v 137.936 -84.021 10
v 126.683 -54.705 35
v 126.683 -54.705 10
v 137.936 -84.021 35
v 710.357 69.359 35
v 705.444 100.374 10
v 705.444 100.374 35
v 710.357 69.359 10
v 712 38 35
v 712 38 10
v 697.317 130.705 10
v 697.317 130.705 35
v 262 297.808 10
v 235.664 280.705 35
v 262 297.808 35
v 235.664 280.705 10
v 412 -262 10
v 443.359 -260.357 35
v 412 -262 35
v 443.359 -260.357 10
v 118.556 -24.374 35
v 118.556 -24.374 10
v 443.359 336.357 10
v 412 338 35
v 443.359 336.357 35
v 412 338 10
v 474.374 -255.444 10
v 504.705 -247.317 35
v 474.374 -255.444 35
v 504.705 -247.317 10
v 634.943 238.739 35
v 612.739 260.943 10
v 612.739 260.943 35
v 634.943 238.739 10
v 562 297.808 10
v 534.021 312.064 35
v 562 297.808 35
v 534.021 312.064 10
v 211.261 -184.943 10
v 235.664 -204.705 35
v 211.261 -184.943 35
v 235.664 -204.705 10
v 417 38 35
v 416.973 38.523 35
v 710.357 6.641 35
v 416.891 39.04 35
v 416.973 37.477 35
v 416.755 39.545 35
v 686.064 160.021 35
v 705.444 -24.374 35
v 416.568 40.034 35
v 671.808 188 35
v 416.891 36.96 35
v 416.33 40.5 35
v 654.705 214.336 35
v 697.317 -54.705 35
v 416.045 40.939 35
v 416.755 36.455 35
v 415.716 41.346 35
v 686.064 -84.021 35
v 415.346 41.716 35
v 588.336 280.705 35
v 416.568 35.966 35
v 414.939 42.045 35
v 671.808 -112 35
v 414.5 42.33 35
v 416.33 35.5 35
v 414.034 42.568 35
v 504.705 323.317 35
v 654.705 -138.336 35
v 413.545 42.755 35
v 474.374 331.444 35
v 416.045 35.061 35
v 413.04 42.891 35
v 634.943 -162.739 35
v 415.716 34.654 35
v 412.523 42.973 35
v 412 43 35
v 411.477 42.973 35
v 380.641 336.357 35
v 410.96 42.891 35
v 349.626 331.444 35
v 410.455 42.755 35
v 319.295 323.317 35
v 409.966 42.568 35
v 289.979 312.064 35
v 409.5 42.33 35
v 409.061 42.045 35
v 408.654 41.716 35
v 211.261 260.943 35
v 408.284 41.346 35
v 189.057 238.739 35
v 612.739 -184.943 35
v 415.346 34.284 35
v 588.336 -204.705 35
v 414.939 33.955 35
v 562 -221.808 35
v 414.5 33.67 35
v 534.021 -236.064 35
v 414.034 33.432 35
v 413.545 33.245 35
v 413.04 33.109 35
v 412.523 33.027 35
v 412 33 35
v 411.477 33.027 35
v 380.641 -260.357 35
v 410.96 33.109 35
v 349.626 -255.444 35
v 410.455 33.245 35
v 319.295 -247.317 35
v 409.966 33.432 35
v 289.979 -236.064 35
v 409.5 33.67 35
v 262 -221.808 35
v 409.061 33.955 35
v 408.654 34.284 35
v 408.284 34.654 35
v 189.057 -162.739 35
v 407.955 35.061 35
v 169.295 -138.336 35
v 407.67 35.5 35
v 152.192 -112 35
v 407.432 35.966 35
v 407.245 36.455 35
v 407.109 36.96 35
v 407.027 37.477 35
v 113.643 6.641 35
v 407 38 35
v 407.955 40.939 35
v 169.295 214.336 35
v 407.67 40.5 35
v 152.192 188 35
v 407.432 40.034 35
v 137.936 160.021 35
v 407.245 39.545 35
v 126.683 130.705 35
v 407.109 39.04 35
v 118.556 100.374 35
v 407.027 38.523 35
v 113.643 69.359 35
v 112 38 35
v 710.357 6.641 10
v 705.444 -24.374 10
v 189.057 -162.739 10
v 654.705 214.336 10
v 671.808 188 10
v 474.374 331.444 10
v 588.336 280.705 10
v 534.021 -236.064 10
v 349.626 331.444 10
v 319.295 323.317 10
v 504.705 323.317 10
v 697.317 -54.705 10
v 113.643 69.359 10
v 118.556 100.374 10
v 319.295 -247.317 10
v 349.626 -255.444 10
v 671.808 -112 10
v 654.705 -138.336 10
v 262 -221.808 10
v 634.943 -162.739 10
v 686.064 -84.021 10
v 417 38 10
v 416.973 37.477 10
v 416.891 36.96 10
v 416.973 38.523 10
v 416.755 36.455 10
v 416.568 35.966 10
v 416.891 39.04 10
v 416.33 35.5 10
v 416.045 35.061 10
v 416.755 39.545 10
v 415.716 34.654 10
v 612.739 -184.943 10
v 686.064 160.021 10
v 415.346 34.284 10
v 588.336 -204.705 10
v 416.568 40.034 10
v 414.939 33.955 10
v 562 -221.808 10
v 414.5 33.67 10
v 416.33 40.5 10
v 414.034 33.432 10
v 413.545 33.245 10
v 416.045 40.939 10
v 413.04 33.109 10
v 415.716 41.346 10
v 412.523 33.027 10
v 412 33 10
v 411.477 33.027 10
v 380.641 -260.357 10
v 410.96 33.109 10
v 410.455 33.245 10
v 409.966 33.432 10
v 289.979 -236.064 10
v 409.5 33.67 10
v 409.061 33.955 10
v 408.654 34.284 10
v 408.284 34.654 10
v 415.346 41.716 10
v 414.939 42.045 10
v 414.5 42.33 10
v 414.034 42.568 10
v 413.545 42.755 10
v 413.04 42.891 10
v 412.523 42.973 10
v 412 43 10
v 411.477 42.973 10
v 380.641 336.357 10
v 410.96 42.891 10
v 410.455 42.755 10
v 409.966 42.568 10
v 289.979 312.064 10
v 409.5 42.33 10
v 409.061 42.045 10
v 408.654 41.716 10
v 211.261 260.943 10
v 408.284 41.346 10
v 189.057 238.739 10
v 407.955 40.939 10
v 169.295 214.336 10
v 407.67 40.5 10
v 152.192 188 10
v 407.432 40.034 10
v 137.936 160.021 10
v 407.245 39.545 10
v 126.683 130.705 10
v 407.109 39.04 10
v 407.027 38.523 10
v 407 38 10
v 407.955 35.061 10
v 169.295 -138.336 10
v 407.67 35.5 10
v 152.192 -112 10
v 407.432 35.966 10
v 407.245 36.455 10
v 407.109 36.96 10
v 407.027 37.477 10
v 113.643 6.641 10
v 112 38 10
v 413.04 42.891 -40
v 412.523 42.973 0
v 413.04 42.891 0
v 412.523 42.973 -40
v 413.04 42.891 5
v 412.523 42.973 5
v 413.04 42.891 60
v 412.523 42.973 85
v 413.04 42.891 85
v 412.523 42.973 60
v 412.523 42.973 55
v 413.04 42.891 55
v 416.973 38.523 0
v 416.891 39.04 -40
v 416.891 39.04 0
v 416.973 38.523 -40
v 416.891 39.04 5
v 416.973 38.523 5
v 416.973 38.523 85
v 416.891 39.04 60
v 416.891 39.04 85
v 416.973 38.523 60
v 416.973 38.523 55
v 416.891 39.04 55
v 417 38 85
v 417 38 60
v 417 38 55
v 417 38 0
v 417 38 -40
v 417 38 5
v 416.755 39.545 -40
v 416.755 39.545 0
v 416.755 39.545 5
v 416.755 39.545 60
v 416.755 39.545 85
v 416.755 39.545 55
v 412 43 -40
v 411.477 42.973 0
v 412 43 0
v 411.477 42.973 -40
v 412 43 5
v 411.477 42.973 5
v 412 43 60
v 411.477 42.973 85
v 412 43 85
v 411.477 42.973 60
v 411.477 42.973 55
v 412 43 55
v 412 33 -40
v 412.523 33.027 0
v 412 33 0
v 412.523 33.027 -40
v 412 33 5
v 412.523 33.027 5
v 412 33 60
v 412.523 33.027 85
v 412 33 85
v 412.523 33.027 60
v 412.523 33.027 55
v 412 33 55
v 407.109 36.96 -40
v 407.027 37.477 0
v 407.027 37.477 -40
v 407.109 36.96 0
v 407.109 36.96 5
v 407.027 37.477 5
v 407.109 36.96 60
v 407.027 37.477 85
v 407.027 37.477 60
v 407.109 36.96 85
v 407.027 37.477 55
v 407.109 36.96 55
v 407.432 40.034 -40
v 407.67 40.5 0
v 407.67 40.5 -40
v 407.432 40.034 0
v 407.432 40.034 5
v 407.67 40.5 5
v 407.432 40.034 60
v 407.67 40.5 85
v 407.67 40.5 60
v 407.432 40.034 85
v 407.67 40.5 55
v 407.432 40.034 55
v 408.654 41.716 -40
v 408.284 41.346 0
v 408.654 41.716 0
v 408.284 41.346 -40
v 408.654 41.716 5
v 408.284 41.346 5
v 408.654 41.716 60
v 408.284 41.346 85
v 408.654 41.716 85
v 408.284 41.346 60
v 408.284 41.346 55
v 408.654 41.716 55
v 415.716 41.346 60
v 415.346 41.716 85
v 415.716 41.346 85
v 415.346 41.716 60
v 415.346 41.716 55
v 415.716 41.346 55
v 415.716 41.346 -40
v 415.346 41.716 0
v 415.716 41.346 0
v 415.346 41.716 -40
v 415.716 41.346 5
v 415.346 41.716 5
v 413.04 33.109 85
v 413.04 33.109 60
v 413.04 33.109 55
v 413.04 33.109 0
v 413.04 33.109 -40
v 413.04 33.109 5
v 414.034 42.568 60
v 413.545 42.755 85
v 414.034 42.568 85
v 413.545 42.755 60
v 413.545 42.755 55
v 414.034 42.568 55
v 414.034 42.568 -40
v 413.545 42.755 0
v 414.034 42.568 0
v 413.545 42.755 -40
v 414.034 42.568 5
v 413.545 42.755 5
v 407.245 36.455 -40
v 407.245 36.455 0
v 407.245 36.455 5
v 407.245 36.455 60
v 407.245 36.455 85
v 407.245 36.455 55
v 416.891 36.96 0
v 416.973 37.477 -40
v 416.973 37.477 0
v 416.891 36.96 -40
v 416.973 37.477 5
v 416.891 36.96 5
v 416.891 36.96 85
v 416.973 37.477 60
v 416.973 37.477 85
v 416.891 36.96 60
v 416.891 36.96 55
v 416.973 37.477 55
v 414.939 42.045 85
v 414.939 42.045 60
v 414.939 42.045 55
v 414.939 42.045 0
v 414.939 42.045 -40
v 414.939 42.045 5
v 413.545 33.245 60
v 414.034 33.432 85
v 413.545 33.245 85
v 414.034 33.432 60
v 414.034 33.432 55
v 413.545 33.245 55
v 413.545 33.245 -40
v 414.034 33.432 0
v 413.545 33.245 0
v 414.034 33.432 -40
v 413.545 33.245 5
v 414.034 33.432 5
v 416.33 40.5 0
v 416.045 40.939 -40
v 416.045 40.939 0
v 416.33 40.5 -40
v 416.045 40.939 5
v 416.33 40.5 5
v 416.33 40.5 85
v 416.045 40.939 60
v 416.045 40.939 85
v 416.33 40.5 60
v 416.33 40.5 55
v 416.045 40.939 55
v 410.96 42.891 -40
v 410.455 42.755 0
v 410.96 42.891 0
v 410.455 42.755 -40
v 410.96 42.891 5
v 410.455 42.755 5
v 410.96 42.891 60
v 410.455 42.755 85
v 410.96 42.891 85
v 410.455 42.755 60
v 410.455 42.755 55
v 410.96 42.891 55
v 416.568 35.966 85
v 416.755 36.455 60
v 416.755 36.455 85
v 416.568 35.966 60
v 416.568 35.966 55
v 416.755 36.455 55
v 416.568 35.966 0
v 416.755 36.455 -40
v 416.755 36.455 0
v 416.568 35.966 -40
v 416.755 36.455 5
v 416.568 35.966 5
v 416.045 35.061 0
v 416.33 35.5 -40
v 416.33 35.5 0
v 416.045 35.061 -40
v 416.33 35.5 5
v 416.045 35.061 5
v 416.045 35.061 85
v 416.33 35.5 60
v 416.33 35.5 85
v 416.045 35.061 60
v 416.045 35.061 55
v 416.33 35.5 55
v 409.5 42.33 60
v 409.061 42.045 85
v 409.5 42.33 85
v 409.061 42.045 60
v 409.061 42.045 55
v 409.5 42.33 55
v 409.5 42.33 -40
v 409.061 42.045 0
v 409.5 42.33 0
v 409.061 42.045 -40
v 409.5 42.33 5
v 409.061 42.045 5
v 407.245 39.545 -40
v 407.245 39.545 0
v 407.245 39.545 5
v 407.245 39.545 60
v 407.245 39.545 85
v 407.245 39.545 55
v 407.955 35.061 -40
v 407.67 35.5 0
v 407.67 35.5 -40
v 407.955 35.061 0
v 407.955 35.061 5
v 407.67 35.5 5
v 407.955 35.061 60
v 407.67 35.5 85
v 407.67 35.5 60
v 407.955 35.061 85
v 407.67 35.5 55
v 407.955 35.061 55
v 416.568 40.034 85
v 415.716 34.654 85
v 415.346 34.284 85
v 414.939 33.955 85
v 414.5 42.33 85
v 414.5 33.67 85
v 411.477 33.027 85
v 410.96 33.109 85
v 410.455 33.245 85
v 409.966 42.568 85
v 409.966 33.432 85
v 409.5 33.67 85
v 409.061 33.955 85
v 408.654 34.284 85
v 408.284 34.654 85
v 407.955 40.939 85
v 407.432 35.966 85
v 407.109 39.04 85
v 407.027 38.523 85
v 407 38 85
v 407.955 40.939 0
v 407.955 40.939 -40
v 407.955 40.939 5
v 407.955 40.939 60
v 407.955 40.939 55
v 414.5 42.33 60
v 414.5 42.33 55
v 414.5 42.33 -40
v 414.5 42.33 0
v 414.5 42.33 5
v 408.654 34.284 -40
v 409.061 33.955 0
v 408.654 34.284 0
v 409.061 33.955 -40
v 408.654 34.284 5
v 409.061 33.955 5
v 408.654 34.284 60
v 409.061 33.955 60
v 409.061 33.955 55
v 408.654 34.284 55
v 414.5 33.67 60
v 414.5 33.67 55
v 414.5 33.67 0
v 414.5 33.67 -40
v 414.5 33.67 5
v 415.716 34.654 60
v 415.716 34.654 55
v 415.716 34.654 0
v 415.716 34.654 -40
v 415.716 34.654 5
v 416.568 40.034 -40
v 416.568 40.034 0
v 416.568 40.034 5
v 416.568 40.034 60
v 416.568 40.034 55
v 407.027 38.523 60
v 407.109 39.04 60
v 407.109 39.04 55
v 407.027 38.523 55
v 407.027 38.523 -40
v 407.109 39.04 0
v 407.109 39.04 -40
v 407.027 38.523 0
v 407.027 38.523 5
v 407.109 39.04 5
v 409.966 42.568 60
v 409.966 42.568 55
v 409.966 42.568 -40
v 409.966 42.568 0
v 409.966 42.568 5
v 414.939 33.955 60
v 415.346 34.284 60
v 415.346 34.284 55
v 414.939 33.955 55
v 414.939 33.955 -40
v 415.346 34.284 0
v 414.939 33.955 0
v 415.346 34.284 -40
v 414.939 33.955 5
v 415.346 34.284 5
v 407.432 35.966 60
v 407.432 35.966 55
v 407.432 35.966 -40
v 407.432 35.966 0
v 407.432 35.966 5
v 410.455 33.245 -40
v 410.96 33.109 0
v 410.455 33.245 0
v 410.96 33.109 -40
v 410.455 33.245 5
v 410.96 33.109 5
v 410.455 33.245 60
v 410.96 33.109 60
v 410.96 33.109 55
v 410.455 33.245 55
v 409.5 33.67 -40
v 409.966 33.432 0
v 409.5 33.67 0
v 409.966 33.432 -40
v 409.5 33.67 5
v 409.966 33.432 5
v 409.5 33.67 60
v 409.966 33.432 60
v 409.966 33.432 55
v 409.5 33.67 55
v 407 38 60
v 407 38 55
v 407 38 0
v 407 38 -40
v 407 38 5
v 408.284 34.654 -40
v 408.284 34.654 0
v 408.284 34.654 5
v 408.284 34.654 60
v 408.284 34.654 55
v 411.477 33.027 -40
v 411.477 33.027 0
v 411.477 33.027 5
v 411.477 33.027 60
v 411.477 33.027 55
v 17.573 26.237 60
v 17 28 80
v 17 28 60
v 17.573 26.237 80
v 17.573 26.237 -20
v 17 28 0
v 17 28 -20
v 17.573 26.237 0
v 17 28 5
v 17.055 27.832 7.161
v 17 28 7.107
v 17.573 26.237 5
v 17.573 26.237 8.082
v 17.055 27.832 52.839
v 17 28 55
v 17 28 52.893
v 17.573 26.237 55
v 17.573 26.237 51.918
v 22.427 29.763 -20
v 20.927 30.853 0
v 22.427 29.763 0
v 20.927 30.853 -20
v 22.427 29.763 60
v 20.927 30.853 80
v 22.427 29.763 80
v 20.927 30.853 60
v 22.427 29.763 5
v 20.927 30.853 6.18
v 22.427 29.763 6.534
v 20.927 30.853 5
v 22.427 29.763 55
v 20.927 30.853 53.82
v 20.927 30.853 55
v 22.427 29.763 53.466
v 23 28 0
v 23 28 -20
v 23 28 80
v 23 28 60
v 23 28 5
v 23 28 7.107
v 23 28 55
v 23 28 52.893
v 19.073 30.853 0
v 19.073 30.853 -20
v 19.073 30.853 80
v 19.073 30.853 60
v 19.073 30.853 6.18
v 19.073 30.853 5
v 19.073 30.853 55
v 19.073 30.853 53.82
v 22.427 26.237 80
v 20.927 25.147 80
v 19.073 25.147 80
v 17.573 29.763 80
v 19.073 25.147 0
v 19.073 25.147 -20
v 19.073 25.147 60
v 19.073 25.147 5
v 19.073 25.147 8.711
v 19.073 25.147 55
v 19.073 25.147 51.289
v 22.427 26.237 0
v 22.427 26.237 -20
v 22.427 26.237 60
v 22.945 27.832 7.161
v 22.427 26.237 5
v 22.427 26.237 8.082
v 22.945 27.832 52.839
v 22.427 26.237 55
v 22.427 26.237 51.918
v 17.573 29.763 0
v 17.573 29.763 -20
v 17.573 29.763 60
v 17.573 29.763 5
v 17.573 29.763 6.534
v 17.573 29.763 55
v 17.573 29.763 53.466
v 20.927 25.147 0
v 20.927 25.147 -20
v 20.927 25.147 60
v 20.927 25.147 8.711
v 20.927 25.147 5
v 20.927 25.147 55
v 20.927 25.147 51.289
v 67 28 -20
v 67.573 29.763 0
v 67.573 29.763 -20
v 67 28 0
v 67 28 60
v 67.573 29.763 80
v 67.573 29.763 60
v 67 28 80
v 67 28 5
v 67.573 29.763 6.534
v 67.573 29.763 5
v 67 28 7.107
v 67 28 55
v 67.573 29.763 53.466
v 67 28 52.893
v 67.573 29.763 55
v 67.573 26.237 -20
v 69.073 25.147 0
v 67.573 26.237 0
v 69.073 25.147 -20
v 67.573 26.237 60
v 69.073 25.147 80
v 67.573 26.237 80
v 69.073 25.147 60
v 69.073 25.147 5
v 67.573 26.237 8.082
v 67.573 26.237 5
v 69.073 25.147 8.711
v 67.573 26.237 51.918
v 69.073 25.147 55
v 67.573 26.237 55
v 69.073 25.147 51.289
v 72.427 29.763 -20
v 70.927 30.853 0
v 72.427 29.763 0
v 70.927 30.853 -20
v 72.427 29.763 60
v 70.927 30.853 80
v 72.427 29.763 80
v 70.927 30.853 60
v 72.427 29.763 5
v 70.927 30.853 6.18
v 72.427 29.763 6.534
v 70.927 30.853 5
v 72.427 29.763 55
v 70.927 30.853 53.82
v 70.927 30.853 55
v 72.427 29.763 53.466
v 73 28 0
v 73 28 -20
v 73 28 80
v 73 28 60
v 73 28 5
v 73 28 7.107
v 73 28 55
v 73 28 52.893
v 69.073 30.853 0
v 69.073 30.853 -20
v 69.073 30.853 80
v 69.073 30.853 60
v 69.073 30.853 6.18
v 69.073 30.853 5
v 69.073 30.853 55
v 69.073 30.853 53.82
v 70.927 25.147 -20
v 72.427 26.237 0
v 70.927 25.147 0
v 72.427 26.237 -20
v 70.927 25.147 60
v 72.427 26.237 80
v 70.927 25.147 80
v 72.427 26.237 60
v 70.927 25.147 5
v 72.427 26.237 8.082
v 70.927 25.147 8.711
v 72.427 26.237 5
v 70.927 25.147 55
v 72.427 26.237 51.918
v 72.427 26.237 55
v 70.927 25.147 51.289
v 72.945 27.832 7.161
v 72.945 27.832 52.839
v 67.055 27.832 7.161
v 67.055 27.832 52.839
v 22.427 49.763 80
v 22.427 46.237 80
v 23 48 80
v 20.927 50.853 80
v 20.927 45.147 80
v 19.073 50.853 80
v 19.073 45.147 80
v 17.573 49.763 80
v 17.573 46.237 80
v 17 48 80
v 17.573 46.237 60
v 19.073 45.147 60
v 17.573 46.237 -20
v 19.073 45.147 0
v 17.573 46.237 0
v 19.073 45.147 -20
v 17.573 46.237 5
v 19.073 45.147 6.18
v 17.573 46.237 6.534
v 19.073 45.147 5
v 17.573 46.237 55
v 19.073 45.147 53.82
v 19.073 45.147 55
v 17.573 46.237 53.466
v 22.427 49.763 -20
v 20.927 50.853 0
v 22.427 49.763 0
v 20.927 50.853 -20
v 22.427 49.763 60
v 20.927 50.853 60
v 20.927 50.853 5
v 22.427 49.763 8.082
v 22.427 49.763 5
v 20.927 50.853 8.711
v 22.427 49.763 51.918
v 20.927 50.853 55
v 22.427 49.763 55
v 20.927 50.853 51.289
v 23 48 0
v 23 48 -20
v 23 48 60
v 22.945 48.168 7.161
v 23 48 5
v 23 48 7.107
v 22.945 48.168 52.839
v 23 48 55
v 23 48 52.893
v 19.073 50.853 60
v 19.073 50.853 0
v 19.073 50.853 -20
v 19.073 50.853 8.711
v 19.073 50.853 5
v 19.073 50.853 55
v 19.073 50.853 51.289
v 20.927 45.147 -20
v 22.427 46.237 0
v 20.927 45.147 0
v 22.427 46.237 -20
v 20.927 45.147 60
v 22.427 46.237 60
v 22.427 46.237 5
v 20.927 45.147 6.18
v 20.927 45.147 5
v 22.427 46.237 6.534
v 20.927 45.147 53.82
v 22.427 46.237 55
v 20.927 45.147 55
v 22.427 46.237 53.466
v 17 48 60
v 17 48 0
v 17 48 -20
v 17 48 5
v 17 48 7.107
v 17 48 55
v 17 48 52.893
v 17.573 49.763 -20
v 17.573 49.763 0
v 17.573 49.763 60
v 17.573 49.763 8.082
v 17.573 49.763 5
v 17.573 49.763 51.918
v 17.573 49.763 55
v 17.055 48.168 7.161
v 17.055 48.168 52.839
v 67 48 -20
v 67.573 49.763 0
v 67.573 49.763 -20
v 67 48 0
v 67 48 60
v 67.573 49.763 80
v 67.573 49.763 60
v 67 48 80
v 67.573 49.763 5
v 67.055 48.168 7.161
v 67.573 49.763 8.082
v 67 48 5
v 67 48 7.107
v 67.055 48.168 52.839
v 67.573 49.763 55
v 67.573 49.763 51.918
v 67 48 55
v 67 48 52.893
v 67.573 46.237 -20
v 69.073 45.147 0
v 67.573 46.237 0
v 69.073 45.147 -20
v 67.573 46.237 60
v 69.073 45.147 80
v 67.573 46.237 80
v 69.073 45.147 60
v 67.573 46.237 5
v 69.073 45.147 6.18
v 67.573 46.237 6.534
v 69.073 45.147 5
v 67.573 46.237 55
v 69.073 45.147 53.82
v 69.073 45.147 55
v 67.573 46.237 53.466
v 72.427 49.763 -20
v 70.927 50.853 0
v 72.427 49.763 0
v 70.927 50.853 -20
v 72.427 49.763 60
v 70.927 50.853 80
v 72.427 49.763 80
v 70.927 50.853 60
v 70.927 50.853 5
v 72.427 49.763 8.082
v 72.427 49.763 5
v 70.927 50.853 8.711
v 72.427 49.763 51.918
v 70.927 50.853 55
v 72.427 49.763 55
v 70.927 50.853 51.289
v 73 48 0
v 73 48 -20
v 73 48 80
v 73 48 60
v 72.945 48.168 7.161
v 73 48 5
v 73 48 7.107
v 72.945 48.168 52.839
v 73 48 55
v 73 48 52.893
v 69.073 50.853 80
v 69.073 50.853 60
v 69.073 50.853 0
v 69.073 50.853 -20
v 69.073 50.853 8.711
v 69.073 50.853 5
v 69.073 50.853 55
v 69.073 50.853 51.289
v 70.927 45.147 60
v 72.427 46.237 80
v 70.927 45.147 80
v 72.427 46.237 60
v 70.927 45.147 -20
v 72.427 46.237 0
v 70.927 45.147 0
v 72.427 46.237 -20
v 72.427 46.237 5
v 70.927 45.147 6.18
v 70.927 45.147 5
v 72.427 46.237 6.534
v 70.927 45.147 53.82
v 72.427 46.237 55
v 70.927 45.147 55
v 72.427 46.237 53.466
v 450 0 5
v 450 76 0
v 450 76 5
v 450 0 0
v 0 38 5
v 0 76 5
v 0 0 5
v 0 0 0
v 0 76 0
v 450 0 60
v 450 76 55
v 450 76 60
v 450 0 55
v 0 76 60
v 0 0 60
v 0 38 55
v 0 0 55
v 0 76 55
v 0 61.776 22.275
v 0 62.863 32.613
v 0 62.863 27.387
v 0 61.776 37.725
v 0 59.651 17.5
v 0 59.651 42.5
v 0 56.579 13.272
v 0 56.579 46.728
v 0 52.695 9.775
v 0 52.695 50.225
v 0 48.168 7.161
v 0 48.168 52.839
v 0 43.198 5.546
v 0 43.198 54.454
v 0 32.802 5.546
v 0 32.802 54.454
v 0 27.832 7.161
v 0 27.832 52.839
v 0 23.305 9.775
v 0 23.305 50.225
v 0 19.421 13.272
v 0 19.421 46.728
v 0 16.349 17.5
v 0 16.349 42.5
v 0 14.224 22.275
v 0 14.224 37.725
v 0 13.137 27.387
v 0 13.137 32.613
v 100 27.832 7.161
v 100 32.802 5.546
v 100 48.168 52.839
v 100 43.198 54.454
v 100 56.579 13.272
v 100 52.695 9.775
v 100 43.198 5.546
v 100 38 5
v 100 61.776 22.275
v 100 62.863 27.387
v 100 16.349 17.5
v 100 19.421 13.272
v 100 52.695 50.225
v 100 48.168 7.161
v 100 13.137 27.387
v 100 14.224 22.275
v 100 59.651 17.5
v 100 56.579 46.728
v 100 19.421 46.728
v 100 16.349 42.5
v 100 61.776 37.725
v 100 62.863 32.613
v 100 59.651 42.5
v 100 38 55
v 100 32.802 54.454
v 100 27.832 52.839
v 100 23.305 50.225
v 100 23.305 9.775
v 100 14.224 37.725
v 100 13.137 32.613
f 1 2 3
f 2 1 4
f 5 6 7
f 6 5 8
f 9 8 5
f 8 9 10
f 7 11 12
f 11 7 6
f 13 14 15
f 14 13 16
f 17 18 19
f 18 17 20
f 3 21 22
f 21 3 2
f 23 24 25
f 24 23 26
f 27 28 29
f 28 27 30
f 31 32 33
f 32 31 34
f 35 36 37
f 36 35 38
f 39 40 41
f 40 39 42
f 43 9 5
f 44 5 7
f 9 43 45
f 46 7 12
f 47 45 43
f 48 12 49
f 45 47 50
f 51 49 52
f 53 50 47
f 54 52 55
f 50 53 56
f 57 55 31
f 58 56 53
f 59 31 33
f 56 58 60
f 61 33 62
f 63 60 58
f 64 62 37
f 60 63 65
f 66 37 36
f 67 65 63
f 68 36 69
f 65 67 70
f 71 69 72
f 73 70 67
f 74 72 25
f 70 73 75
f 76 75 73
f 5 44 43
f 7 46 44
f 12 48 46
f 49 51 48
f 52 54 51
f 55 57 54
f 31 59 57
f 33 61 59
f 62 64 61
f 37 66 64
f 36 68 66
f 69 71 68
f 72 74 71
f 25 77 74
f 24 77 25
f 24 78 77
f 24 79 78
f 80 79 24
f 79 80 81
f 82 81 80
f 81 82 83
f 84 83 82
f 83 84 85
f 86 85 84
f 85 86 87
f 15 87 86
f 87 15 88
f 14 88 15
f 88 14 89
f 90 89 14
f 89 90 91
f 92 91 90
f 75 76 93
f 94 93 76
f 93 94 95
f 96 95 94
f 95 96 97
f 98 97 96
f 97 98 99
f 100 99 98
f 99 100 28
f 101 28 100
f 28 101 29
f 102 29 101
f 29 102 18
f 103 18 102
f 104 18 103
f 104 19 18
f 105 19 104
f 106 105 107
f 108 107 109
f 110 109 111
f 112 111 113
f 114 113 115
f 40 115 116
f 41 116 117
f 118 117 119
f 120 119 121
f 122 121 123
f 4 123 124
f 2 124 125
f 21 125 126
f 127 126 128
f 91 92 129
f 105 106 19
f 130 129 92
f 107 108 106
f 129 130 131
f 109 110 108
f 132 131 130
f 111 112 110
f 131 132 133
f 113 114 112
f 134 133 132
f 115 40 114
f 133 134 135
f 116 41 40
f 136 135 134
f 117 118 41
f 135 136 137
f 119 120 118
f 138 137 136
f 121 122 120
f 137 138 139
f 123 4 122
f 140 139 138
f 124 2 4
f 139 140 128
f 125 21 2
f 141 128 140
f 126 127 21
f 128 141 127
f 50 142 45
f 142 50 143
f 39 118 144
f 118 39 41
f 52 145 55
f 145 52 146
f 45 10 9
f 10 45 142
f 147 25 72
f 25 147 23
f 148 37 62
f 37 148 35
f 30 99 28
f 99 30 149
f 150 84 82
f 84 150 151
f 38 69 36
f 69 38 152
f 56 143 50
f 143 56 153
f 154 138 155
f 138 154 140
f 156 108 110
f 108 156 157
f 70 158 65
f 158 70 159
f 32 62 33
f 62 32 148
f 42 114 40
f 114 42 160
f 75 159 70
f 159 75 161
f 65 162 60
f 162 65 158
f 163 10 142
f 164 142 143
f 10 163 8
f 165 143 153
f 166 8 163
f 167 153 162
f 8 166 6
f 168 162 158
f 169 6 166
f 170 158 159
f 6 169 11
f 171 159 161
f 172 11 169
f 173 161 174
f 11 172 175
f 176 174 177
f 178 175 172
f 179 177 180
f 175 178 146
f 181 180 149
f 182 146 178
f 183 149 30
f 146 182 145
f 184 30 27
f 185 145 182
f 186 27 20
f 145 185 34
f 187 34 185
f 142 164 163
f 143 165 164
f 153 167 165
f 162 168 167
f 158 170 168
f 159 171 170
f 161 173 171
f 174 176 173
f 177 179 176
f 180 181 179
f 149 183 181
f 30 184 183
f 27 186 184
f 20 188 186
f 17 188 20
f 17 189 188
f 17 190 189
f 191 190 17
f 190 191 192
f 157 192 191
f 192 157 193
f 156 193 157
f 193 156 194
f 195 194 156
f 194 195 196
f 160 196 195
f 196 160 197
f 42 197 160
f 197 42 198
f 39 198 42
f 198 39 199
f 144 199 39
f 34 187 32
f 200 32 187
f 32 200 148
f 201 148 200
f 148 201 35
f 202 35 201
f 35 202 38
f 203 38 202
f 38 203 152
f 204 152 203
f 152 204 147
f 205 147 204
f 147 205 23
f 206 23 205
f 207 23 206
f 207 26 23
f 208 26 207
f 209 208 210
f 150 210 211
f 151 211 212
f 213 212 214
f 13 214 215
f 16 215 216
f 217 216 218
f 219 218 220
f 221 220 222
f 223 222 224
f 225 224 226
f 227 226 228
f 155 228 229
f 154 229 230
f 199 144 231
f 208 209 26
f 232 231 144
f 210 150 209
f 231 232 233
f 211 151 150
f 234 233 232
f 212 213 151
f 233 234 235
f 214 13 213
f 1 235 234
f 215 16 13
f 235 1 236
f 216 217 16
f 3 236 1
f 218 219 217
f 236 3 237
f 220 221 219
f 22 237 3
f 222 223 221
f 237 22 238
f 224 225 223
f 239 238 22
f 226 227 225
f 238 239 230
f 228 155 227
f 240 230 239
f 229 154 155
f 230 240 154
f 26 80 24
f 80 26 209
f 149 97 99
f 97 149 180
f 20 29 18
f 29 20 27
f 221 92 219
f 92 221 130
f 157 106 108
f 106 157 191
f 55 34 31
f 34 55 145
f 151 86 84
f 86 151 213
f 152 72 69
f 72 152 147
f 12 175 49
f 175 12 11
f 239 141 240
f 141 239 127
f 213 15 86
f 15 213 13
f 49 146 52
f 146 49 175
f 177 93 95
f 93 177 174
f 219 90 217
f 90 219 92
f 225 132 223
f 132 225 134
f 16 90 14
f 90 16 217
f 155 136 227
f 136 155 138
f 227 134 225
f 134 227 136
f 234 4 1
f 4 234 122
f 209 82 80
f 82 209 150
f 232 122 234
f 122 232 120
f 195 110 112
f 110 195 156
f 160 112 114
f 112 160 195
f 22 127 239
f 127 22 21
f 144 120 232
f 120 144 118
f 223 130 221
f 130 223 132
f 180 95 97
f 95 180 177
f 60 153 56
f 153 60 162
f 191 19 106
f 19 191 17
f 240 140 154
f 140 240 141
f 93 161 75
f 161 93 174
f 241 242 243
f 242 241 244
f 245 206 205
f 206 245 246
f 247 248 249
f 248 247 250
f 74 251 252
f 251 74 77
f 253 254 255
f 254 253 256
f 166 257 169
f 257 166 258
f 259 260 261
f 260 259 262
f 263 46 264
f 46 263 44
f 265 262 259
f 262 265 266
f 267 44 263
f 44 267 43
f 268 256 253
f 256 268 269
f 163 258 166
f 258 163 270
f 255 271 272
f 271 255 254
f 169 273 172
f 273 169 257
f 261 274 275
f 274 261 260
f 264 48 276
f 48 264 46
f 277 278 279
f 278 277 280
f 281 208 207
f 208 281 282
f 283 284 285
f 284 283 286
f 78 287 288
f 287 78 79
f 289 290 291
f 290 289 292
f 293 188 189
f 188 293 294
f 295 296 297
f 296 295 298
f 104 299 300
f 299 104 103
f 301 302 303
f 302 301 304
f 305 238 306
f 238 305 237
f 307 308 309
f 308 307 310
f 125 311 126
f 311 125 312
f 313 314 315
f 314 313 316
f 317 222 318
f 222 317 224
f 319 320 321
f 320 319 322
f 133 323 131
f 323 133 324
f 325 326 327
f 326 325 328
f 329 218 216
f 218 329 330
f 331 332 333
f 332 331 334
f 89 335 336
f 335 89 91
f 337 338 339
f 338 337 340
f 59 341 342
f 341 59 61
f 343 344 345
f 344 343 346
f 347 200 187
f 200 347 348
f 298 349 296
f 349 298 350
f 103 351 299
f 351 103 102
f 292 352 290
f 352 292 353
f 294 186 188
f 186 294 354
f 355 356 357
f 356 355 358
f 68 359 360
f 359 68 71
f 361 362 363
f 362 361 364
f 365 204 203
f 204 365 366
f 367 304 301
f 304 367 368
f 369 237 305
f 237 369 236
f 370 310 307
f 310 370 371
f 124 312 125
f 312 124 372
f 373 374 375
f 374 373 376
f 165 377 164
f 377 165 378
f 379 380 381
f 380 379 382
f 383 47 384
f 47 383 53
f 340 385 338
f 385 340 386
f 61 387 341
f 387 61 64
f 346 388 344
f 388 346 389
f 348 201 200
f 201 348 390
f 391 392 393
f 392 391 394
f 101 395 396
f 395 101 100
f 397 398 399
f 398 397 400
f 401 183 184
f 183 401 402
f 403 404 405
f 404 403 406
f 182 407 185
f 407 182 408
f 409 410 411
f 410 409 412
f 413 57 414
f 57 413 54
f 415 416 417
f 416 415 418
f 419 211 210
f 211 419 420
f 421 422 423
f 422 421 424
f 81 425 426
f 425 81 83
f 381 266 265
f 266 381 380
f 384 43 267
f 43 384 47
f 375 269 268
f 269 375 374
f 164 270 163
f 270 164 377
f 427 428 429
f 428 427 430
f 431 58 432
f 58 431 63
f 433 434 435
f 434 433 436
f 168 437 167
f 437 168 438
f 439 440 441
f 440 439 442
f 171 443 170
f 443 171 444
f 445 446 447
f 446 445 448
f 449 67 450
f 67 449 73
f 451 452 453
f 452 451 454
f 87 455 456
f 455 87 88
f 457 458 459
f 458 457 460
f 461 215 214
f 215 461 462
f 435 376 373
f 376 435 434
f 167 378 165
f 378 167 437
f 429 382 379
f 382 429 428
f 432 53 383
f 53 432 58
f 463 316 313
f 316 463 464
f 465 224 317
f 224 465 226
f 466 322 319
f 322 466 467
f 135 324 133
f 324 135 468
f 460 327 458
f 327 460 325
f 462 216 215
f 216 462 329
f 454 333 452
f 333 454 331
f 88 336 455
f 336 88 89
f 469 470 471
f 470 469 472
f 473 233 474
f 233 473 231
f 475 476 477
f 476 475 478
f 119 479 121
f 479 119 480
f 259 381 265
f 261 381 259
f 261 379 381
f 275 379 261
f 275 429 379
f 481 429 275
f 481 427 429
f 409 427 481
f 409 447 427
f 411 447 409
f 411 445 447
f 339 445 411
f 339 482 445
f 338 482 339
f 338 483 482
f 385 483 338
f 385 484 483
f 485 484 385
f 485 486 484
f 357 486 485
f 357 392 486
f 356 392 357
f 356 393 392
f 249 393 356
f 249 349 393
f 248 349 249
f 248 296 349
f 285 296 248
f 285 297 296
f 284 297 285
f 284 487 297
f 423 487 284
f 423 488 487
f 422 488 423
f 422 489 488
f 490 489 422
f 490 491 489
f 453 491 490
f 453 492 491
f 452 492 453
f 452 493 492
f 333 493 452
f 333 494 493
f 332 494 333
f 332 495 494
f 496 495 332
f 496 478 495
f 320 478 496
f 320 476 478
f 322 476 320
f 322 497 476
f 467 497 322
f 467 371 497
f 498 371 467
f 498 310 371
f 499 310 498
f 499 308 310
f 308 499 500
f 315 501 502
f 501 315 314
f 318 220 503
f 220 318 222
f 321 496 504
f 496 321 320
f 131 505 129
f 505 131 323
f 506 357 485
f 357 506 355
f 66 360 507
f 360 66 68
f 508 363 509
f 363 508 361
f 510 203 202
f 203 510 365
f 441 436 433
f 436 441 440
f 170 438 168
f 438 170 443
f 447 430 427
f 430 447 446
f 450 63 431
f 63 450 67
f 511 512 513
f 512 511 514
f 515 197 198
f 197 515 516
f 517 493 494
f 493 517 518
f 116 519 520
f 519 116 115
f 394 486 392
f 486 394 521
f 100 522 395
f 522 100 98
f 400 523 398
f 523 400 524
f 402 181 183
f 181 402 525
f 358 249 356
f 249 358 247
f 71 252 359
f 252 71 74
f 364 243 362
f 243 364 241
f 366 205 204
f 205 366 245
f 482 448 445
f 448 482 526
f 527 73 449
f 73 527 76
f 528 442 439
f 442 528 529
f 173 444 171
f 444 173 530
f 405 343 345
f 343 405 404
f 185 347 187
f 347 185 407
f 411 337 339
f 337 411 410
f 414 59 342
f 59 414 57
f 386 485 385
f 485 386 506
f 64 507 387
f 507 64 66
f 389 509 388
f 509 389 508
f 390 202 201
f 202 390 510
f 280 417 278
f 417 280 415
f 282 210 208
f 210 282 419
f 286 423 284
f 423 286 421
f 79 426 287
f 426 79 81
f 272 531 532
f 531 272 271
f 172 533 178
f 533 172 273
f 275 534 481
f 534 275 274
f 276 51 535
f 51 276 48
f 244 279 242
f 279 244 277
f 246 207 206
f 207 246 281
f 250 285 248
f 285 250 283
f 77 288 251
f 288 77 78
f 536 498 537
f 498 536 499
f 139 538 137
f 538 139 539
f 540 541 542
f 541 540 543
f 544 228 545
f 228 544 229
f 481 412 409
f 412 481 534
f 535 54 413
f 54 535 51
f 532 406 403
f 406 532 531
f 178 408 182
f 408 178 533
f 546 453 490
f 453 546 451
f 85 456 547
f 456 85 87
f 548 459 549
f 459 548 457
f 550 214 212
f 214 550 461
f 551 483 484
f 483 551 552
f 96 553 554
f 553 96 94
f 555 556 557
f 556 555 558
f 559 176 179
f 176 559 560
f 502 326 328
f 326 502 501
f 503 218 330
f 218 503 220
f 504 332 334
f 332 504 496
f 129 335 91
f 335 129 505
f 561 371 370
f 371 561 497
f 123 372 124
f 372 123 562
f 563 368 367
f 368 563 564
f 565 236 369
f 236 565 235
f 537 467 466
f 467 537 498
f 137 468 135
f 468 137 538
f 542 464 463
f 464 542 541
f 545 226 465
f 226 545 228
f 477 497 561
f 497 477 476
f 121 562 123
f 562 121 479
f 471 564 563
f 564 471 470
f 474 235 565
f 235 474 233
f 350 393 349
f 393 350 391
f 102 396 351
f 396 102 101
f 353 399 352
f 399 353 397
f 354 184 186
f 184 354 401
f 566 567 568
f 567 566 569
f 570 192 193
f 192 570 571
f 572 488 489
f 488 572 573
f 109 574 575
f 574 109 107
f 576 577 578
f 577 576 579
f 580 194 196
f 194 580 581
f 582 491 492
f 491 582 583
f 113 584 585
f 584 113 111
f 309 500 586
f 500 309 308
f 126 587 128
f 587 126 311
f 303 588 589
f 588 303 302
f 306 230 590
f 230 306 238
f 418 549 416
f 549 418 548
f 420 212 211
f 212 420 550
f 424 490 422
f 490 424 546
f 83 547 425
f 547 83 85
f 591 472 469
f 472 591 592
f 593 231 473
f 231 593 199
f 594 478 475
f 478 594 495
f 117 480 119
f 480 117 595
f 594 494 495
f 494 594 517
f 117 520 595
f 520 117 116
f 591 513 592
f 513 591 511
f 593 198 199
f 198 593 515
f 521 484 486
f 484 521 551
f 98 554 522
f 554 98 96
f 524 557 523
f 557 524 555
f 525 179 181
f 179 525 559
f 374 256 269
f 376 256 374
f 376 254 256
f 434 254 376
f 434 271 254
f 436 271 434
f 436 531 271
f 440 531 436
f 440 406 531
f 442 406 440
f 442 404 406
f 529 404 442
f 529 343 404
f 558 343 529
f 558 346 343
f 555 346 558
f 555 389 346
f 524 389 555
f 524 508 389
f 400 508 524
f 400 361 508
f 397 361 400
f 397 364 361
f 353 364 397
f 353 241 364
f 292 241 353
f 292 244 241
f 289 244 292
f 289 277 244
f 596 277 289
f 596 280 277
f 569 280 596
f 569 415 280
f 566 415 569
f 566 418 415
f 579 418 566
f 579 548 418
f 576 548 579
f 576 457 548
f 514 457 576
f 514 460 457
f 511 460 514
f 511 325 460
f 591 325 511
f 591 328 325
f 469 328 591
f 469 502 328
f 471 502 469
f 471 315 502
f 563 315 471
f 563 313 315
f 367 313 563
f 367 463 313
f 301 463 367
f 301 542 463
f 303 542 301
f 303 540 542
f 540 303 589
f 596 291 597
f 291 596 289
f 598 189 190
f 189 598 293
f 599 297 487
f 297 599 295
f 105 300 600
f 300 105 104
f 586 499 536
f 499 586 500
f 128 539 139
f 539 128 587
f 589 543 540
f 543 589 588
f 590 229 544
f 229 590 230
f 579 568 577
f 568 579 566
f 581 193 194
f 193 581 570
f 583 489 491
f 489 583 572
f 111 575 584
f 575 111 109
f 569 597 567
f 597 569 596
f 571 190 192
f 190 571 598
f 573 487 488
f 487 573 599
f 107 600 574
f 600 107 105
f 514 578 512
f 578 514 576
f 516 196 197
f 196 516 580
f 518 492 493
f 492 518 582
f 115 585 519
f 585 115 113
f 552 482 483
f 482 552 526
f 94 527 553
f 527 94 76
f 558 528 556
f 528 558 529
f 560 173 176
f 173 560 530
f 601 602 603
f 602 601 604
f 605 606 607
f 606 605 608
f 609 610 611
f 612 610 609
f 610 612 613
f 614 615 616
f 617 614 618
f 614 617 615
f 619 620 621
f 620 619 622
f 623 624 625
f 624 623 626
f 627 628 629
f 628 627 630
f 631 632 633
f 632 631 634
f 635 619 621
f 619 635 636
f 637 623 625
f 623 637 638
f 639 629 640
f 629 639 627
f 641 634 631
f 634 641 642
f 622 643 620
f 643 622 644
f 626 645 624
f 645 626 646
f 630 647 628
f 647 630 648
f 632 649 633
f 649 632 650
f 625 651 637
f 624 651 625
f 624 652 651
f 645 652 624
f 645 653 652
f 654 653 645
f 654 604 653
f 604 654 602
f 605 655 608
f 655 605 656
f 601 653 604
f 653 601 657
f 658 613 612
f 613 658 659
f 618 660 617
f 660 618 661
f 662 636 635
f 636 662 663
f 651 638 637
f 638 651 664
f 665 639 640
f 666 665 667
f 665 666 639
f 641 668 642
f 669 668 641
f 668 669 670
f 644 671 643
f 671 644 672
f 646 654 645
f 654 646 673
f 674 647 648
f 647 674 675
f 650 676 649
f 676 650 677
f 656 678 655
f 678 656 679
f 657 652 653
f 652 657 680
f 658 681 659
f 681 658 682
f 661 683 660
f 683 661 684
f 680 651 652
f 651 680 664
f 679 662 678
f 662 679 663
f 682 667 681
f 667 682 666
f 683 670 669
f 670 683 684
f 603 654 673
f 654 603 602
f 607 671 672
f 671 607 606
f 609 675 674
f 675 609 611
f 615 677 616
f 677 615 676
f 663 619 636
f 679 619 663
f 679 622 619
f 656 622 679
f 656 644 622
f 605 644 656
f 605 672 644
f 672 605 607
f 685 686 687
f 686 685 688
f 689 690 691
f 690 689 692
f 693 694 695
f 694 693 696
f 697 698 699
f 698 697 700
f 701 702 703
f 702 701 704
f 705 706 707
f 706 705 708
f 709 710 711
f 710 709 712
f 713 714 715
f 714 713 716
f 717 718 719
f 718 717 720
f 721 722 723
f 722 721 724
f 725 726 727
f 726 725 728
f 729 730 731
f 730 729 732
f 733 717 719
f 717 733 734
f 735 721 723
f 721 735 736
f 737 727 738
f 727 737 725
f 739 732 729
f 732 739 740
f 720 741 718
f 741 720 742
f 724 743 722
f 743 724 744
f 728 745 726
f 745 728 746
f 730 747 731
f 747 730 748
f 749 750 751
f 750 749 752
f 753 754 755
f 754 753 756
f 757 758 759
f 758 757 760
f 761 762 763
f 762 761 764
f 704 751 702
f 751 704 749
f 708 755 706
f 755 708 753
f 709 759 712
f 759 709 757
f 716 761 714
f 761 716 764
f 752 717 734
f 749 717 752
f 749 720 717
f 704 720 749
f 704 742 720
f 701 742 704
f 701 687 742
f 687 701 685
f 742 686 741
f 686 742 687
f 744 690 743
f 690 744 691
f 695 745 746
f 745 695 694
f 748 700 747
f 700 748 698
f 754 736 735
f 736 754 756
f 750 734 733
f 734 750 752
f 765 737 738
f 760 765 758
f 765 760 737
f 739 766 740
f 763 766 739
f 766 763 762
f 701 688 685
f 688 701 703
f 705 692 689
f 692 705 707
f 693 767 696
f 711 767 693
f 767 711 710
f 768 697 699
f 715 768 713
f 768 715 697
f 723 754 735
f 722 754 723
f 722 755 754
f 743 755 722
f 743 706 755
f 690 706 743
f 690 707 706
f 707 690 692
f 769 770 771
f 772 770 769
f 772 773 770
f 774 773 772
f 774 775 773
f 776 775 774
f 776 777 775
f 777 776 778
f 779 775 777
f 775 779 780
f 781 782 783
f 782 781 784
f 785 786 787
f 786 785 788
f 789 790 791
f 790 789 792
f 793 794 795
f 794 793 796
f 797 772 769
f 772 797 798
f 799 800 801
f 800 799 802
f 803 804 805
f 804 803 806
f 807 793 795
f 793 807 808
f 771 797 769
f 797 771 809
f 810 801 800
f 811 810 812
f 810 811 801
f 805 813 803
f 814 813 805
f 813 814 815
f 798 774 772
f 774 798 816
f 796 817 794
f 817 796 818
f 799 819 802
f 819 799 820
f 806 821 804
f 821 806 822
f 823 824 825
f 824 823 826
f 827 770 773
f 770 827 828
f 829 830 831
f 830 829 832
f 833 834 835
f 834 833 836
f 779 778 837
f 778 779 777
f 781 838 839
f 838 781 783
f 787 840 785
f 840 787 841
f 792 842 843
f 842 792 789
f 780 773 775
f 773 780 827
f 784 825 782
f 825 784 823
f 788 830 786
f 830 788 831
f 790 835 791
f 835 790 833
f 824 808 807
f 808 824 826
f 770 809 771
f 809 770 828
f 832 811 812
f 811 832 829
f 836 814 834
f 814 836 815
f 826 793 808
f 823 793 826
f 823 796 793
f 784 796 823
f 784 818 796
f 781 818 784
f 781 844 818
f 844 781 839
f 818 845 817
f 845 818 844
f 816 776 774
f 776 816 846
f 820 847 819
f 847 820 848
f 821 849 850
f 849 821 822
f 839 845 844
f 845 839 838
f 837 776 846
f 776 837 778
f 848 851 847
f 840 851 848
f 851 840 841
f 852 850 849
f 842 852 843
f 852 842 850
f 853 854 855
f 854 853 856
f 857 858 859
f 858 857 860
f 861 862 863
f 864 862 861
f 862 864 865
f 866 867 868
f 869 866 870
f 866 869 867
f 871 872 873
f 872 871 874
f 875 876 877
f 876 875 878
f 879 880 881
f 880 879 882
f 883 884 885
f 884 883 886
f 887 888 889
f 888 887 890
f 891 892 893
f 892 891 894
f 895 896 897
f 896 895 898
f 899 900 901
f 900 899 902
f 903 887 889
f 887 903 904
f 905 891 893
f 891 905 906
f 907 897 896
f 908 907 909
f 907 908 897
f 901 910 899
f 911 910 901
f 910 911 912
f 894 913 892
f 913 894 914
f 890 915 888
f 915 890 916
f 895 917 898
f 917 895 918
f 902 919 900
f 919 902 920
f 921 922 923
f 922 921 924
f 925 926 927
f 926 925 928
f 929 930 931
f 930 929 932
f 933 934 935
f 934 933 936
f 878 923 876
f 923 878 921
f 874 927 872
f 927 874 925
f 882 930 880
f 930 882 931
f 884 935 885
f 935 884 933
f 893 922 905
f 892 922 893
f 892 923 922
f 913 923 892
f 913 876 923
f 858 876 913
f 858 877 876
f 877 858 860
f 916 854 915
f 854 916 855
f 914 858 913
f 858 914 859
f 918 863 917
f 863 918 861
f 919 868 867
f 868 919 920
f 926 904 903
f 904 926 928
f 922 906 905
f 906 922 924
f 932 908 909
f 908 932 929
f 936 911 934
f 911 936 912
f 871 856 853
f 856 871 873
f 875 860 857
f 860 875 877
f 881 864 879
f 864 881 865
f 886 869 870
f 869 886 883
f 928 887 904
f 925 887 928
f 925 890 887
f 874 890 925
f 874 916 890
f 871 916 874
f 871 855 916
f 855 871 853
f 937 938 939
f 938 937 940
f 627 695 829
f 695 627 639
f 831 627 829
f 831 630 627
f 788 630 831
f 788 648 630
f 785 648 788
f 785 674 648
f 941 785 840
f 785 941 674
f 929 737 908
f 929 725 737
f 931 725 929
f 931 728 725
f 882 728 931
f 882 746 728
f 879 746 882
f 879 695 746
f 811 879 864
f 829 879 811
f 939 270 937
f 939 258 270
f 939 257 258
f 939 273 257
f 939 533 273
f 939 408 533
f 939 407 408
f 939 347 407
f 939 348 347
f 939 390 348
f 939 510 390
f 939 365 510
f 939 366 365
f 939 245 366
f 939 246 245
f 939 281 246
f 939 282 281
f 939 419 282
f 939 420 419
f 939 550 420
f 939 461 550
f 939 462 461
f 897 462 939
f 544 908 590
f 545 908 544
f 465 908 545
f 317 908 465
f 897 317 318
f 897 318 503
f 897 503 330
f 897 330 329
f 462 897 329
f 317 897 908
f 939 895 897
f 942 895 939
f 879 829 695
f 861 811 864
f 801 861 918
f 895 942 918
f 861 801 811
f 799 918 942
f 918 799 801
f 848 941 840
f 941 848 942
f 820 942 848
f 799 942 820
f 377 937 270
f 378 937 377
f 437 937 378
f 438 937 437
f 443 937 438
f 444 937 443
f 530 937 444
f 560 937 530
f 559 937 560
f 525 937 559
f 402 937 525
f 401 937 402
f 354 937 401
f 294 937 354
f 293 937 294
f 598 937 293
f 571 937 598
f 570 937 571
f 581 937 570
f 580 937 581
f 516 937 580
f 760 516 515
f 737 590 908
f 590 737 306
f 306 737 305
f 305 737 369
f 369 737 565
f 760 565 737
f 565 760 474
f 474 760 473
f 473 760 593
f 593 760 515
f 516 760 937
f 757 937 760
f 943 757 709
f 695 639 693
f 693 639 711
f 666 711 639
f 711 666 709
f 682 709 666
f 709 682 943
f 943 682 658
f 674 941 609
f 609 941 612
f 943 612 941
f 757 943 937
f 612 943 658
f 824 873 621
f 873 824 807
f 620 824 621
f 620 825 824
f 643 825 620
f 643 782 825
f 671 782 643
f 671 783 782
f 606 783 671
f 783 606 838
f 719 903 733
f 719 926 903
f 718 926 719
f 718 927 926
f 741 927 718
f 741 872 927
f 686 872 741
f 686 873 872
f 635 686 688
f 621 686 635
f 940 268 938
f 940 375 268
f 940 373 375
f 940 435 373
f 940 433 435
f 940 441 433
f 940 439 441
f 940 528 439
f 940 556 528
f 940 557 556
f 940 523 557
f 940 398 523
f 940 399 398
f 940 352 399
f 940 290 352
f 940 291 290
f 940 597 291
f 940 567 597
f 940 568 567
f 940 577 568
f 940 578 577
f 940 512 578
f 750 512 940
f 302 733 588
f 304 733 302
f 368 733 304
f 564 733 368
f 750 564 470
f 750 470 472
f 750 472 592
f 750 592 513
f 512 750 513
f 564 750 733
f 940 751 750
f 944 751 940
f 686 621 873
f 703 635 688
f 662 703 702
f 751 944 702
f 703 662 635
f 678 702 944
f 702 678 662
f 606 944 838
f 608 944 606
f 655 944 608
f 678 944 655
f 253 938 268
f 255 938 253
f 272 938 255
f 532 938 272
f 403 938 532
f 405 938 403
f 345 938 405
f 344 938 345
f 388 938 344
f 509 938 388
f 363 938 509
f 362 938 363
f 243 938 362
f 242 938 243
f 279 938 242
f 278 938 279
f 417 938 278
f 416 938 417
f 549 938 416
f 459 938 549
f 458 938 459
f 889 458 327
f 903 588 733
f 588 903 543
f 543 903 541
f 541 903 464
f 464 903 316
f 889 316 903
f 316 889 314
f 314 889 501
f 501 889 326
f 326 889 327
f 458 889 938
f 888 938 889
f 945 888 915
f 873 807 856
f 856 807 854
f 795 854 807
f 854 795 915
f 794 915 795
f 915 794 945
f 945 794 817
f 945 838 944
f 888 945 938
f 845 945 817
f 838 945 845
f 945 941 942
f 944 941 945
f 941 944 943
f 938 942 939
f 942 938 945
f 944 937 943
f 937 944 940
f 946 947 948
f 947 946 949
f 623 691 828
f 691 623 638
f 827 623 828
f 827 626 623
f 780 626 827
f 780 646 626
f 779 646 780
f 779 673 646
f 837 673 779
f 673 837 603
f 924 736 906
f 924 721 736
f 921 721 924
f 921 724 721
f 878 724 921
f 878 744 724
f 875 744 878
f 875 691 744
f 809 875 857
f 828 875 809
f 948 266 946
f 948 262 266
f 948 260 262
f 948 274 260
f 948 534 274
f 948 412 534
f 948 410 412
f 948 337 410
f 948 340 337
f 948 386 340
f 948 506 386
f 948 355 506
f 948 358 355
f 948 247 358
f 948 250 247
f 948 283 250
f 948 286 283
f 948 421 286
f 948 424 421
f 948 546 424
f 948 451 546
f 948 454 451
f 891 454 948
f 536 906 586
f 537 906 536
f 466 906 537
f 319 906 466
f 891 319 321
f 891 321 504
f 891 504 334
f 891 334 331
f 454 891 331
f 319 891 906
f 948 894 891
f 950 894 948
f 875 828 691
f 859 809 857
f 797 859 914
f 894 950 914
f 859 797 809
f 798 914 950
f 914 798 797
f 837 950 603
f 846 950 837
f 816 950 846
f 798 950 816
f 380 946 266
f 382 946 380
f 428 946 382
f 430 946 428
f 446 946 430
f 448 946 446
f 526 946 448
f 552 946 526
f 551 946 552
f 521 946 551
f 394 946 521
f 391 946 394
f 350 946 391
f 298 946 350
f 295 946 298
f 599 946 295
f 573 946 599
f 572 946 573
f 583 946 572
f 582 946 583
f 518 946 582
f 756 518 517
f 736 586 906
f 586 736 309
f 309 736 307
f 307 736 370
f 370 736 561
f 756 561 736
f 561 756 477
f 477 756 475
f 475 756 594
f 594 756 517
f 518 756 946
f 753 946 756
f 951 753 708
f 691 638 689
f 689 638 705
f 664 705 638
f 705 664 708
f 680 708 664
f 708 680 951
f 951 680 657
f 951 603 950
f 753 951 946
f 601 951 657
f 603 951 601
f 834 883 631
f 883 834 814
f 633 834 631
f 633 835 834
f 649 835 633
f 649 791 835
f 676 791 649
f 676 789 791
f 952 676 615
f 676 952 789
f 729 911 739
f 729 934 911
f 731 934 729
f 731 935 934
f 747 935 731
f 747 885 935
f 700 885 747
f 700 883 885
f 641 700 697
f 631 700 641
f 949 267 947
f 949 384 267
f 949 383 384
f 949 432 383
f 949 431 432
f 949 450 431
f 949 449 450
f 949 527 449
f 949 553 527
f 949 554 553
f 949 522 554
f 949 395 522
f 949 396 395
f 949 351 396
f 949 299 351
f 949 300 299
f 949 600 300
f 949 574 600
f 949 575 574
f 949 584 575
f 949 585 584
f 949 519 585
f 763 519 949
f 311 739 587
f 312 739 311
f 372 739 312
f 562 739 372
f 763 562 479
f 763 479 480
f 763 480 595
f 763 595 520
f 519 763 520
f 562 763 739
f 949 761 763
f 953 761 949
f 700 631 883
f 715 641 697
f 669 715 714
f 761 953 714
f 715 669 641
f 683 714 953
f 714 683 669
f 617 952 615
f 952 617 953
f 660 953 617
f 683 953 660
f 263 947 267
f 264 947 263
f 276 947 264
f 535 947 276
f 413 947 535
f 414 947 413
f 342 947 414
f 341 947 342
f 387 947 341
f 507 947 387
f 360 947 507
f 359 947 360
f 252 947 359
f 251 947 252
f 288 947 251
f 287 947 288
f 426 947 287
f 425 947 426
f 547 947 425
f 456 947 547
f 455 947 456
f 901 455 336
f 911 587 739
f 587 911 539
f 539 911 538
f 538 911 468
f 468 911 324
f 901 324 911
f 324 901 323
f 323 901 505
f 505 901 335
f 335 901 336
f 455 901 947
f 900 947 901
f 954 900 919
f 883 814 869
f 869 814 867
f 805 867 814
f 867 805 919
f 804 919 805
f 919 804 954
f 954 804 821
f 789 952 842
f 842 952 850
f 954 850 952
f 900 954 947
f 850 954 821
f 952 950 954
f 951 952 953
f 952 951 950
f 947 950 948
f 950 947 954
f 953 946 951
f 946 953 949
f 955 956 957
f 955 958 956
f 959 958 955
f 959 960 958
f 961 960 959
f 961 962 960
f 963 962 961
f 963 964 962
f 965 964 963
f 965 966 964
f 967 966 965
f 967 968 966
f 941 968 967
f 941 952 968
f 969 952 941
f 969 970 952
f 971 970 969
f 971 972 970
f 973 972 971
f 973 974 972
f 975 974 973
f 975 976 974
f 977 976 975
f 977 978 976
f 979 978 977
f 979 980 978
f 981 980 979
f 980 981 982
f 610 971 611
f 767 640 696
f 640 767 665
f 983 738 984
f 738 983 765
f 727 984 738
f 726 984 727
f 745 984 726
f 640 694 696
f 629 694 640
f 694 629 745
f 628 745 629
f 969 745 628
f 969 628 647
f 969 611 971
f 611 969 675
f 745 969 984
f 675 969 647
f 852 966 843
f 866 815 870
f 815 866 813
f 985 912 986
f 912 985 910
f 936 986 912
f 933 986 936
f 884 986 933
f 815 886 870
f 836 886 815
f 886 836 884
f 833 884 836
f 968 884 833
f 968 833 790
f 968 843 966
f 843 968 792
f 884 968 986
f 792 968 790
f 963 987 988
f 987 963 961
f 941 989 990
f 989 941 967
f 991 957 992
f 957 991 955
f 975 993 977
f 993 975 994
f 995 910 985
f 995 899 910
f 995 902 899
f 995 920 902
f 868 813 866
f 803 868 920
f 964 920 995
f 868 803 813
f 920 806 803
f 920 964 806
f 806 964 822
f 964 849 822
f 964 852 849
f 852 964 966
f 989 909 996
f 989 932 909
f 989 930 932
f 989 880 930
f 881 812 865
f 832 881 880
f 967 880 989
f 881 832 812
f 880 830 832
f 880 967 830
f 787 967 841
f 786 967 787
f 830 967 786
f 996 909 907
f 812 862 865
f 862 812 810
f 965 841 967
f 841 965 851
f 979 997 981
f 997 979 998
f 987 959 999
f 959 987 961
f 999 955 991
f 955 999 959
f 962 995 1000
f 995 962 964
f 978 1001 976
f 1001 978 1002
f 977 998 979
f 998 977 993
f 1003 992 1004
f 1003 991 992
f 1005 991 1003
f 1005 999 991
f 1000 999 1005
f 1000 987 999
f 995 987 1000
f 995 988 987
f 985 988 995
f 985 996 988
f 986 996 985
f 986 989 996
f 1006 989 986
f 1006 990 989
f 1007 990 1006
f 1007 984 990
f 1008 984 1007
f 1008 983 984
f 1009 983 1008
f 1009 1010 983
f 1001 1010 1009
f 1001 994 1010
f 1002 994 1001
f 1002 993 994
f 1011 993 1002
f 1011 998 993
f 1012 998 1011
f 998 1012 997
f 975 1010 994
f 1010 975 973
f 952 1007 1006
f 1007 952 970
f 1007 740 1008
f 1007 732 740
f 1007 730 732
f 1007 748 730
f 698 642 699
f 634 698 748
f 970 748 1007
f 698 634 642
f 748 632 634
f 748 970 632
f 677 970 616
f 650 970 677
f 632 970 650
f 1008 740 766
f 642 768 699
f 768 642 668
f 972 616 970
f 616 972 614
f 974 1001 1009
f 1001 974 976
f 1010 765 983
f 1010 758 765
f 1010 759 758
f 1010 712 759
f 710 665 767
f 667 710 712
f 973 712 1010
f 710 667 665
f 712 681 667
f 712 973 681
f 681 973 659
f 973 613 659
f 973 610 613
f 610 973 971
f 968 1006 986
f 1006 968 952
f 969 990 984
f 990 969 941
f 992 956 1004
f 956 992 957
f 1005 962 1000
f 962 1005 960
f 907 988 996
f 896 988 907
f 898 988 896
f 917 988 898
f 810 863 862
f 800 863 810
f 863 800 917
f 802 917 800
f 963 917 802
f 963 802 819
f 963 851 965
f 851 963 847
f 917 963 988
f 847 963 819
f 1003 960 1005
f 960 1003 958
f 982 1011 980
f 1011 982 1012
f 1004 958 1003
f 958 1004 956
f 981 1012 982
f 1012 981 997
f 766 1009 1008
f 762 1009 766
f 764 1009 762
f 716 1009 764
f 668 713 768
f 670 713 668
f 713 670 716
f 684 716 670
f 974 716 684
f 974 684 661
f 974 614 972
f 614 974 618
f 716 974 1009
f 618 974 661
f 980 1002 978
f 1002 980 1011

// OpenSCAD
forkL = 450;
forkW = 76;
thickness = 5;

wheelR = 300;
forkSpacing = 55;
axleR = 5;
screwR = 3;

module rodCavity() {
  rotate([0, 90, 0])
  cylinder(r=25, h=100);
}

module screwMountCavity(x,y,h) {
  translate([0, 0, -20]) {
    cylinder(r=screwR, h=h);
    translate([x, 0, 0])
    cylinder(r=screwR, h=h);
    translate([0, y, 0])
    cylinder(r=screwR, h=h);
    translate([x, y, 0])
    cylinder(r=screwR, h=h);
  }
}

module wheelCavity() {
  cylinder(r=wheelR, h=25, $fn=60);
  translate([0, 0, -50])
  cylinder(r=axleR, h=125, $fn=60);
}

module fork() {
//  difference() {
  cube([forkL, forkW, thickness]);
  translate([0, 0, forkSpacing])
  cube([forkL, forkW, thickness]);

  translate([forkL-(forkW/2), forkW/2, 10])
  wheelCavity();

  translate([0, forkW/2, 25+thickness])
  rodCavity();

  translate([20, (forkW - 20) / 2, 0])
  screwMountCavity(50, 20, 100);
// }
}

fork();
